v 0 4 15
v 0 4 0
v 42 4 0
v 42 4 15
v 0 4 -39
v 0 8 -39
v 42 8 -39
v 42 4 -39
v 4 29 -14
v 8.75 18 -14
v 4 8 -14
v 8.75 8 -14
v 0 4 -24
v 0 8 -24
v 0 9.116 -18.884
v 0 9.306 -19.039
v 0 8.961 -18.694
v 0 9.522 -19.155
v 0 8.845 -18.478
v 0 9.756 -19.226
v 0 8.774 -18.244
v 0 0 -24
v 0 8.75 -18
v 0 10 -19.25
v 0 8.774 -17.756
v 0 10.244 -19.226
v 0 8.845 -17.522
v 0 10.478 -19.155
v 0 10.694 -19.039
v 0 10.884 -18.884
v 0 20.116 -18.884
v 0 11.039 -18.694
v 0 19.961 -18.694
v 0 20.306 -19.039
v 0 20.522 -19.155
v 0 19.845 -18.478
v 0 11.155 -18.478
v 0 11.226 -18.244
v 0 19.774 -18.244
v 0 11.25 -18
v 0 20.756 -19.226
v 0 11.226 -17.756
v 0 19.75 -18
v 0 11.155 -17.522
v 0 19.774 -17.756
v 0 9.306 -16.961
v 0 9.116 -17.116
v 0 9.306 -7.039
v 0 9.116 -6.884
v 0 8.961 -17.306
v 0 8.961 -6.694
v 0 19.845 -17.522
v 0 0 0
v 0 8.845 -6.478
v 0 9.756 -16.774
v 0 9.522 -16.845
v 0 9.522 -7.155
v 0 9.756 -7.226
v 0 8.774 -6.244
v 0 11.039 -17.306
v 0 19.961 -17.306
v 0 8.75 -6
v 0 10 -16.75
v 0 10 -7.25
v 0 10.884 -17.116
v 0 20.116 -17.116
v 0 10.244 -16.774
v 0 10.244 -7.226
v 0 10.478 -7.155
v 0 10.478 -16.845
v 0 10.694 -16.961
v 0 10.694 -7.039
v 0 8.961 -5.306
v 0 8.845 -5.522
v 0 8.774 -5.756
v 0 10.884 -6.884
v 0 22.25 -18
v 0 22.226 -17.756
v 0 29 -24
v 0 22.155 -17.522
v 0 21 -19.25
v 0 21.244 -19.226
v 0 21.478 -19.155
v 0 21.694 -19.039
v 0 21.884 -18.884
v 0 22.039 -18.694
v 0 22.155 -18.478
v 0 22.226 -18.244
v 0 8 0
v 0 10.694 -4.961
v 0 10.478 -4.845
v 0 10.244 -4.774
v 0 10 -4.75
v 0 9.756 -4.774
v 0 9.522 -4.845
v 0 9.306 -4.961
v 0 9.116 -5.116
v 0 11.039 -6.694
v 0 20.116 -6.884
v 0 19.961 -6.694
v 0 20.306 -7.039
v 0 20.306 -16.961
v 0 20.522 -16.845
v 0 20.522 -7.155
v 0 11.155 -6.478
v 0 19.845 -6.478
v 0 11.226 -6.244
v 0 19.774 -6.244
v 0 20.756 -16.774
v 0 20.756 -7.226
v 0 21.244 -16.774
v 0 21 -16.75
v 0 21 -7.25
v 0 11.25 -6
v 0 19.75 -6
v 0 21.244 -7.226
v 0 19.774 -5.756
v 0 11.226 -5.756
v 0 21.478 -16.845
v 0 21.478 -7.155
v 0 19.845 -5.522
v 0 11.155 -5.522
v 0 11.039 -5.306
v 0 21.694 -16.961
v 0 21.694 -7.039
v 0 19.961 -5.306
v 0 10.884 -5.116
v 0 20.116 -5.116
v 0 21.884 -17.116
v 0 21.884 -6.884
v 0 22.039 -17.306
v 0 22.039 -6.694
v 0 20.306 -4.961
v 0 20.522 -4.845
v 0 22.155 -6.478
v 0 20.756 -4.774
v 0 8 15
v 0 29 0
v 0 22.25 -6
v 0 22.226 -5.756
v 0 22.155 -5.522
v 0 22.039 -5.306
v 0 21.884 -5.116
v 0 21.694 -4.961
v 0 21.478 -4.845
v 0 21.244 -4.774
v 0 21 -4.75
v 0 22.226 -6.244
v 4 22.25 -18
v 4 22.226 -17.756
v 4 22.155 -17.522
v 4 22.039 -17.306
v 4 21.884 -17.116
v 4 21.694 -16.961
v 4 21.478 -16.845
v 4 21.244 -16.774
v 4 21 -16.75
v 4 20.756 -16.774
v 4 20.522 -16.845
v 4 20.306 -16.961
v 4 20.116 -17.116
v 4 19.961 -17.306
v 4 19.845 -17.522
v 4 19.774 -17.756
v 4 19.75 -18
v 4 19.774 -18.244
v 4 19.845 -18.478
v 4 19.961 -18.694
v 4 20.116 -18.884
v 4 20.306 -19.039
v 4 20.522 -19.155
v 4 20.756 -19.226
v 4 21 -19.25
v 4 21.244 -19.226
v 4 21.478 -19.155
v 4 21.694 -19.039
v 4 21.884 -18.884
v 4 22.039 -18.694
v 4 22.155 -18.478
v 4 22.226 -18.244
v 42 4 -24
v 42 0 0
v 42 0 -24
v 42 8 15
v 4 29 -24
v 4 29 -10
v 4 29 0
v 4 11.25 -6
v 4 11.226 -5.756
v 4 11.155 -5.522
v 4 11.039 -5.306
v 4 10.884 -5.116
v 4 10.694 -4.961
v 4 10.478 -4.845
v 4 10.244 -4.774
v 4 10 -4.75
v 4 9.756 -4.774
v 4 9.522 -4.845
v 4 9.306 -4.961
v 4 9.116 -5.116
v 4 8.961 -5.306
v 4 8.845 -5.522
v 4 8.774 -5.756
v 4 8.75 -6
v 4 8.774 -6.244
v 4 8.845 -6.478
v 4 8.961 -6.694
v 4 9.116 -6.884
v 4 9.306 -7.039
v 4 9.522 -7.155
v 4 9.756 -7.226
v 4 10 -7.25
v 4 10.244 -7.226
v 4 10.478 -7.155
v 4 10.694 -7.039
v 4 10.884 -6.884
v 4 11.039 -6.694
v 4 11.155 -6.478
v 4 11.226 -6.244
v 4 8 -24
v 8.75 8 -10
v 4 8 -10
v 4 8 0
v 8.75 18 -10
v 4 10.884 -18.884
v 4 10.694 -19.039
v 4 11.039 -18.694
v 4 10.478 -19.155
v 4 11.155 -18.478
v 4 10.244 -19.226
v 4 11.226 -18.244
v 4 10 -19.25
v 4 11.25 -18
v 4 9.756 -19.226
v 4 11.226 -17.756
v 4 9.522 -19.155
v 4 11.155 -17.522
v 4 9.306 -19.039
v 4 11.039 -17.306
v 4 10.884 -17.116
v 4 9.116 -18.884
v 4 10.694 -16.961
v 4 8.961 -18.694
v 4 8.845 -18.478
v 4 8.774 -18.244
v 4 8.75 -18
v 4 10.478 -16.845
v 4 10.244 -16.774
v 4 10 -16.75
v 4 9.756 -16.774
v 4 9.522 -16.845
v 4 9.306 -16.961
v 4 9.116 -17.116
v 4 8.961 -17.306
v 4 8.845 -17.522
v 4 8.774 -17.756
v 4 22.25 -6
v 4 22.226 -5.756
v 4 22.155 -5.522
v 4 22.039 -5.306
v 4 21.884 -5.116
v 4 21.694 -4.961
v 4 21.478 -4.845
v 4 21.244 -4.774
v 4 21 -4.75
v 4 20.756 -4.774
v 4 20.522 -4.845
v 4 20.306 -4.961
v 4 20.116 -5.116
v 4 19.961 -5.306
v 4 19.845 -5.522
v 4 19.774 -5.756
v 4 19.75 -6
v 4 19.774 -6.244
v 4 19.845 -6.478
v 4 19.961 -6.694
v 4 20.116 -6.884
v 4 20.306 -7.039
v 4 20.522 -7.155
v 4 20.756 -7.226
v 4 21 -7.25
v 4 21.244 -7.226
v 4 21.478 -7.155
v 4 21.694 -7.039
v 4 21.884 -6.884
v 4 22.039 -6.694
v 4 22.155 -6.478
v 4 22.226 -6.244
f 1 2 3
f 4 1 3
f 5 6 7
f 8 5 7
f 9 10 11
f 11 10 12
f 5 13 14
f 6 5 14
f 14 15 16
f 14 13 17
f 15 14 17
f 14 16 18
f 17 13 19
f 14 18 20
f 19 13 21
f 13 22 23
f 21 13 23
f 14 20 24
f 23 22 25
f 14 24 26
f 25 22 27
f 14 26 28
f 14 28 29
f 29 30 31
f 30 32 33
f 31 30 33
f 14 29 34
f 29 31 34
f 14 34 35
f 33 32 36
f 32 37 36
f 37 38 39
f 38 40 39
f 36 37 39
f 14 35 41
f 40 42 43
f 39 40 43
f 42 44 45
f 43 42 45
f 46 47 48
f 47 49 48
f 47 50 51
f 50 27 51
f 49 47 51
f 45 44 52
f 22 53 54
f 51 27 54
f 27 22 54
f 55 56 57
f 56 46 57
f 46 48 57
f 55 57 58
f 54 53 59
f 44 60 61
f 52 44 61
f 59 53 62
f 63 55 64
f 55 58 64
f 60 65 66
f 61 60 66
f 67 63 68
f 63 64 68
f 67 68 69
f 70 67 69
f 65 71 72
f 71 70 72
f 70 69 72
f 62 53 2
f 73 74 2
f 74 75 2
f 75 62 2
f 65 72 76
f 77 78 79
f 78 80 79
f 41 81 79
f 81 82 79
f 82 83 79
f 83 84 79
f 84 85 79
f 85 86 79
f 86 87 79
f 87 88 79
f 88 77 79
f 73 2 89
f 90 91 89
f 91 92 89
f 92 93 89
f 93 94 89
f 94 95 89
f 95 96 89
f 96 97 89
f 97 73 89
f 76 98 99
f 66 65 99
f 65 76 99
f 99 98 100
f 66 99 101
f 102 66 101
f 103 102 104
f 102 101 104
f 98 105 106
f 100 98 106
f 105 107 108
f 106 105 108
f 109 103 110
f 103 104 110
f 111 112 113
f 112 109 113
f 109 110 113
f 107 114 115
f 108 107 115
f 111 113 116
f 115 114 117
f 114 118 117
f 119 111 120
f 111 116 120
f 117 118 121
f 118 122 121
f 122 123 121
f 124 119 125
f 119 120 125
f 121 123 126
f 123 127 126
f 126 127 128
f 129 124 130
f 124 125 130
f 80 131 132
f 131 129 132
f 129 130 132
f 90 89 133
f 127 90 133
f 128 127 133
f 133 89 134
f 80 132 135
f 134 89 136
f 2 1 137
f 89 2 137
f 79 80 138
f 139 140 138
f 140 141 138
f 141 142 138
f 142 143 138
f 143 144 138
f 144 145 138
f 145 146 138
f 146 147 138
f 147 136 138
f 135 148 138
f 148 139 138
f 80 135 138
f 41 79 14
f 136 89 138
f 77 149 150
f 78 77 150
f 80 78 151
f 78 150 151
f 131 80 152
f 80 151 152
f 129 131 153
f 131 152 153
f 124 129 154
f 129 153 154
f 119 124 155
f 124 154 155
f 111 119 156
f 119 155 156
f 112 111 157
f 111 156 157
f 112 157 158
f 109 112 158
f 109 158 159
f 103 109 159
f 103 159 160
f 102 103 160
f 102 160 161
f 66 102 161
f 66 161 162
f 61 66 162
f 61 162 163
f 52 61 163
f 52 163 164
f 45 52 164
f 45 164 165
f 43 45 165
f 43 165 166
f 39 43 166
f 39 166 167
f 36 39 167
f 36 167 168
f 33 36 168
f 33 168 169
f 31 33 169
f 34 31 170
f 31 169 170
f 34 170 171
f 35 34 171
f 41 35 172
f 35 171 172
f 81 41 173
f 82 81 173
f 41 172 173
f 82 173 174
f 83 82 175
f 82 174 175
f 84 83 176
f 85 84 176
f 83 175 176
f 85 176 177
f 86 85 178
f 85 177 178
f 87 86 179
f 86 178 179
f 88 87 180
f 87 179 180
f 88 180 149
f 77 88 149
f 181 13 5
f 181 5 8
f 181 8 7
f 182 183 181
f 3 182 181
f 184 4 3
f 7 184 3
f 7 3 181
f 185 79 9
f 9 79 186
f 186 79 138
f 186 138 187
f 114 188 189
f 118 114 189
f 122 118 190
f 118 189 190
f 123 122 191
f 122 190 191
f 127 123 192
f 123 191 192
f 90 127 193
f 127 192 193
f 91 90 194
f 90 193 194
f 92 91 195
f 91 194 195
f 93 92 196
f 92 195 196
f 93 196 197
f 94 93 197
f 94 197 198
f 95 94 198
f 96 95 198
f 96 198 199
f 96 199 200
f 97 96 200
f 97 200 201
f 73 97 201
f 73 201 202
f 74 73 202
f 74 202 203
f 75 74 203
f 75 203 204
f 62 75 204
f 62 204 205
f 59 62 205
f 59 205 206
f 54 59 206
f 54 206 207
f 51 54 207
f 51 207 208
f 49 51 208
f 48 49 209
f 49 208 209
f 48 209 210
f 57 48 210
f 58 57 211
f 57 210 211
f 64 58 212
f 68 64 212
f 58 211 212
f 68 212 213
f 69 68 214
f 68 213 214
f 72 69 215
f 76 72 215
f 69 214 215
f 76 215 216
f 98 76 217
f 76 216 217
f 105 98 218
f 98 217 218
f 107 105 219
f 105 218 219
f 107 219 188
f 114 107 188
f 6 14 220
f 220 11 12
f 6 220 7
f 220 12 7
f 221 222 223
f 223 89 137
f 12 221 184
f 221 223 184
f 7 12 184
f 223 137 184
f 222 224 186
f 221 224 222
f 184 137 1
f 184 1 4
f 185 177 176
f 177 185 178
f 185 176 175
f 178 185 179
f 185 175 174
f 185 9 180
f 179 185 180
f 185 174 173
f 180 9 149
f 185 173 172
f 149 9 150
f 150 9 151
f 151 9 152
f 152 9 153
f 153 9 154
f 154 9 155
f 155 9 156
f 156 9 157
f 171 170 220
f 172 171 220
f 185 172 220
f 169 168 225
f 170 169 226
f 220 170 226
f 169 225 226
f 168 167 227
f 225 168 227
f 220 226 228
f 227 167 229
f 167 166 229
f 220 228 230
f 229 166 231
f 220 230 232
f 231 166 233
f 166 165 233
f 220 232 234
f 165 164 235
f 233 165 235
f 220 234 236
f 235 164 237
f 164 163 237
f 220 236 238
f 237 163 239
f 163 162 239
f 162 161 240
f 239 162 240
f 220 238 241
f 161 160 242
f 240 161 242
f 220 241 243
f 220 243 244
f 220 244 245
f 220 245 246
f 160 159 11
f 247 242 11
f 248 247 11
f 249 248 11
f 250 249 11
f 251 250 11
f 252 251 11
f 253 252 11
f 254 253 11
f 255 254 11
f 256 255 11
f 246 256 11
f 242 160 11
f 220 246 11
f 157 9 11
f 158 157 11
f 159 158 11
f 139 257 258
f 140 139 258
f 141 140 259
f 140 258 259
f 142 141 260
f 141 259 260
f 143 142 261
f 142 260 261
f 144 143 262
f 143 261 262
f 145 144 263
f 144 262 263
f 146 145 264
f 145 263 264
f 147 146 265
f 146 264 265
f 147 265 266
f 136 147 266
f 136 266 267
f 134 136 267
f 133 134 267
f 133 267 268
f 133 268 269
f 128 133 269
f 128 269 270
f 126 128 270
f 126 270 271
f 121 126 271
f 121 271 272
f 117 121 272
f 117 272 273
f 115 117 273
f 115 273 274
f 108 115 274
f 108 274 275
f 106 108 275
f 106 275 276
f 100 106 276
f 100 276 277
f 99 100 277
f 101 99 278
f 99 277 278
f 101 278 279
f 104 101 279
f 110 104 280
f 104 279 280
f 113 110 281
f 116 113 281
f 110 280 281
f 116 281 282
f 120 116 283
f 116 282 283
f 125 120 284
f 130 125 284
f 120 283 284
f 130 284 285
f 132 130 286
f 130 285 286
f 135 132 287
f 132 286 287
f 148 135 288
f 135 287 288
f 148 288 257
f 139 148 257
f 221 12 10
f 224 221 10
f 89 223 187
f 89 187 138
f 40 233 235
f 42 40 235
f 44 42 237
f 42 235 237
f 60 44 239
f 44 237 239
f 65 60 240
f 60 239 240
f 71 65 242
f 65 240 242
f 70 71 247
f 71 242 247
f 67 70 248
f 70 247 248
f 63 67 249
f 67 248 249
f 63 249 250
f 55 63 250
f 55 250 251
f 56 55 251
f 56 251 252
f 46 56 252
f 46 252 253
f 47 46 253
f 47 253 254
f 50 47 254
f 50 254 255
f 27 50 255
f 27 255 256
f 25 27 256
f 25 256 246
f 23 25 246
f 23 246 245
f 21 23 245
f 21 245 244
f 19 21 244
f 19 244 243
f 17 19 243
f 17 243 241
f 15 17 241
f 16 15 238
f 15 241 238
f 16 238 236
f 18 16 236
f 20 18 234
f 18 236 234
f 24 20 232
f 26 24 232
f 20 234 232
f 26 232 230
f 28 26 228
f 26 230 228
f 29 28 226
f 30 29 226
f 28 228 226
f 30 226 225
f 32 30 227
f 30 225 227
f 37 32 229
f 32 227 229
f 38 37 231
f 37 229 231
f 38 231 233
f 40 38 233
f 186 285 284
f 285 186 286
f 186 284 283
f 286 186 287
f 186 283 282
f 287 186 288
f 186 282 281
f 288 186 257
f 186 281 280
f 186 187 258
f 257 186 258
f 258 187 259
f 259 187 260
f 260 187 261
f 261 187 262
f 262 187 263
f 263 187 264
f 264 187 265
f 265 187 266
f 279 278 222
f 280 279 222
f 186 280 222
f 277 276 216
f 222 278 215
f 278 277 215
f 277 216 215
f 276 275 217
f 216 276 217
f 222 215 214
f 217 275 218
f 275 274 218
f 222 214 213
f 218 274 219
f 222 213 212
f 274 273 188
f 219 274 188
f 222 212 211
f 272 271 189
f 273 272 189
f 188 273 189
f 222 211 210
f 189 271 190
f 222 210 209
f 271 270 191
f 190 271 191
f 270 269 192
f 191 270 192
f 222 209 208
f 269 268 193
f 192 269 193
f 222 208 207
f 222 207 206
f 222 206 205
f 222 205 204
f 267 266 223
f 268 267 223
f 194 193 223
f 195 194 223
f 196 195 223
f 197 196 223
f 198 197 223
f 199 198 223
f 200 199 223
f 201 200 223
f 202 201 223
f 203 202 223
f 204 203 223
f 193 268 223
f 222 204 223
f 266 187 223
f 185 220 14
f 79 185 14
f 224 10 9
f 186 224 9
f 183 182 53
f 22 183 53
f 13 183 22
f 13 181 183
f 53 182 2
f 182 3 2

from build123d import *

# Parameters (mm, degrees)
EXTRUDE_1_DEPTH      = 24
SKETCH_2_W           = 42
SKETCH_2_H           = 4
EXTRUDE_2_DEPTH      = 15
EXTRUDE_3_DEPTH      = 2
EXTRUDE_3_DEPTH_BACK = 2
SKETCH_5_R           = 1.25
CUT_EXTRUDE_1_DEPTH  = 62.692787261


with BuildPart() as part:
    # Эскиз1 → Бобышка-Вытянуть1 (new body)
    with BuildSketch(Plane.XY):
        Polygon((0, 0), (0, 29), (4, 29), (4, 8), (42, 8), (42, 0), align=None)
    extrude(amount=-EXTRUDE_1_DEPTH)

    # Эскиз2 → Бобышка-Вытянуть2 (add)
    with BuildSketch(Plane.XY):
        with Locations((21, 6)):
            Rectangle(SKETCH_2_W, SKETCH_2_H)
    extrude_2 = extrude(amount=EXTRUDE_2_DEPTH)

    # Зеркальное отражение1: Бобышка-Вытянуть2 across plane
    add(extrude_2.mirror(Plane.XY.offset(-12)))

    # Эскиз4 → Бобышка-Вытянуть3 (add, two sides: drawn at the far end of the back side and taken through both)
    with BuildSketch(Plane(origin=(0, 0, -12), x_dir=(0, -1, 0), z_dir=(0, 0, 1)).offset(-EXTRUDE_3_DEPTH_BACK)):
        Polygon((-8, 8.75), (-18, 8.75), (-29, 4), (-8, 4), align=None)
    extrude(amount=EXTRUDE_3_DEPTH + EXTRUDE_3_DEPTH_BACK)

    # Эскиз5 → Вырез-Вытянуть1 (cut, through all)
    with BuildSketch(Plane(origin=(4, 0, 0), x_dir=(0, 0, -1), z_dir=(1, 0, 0))):
        with Locations(Location((6, 21, 0), (0, 0, 90))):
            Circle(SKETCH_5_R)
        with Locations(Location((6, 10, 0), (0, 0, 90))):
            Circle(SKETCH_5_R)
        with Locations(Location((18, 10, 0), (0, 0, 90))):
            Circle(SKETCH_5_R)
        with Locations(Location((18, 21, 0), (0, 0, 90))):
            Circle(SKETCH_5_R)
    extrude(amount=-CUT_EXTRUDE_1_DEPTH, mode=Mode.SUBTRACT)


solid = part.part
